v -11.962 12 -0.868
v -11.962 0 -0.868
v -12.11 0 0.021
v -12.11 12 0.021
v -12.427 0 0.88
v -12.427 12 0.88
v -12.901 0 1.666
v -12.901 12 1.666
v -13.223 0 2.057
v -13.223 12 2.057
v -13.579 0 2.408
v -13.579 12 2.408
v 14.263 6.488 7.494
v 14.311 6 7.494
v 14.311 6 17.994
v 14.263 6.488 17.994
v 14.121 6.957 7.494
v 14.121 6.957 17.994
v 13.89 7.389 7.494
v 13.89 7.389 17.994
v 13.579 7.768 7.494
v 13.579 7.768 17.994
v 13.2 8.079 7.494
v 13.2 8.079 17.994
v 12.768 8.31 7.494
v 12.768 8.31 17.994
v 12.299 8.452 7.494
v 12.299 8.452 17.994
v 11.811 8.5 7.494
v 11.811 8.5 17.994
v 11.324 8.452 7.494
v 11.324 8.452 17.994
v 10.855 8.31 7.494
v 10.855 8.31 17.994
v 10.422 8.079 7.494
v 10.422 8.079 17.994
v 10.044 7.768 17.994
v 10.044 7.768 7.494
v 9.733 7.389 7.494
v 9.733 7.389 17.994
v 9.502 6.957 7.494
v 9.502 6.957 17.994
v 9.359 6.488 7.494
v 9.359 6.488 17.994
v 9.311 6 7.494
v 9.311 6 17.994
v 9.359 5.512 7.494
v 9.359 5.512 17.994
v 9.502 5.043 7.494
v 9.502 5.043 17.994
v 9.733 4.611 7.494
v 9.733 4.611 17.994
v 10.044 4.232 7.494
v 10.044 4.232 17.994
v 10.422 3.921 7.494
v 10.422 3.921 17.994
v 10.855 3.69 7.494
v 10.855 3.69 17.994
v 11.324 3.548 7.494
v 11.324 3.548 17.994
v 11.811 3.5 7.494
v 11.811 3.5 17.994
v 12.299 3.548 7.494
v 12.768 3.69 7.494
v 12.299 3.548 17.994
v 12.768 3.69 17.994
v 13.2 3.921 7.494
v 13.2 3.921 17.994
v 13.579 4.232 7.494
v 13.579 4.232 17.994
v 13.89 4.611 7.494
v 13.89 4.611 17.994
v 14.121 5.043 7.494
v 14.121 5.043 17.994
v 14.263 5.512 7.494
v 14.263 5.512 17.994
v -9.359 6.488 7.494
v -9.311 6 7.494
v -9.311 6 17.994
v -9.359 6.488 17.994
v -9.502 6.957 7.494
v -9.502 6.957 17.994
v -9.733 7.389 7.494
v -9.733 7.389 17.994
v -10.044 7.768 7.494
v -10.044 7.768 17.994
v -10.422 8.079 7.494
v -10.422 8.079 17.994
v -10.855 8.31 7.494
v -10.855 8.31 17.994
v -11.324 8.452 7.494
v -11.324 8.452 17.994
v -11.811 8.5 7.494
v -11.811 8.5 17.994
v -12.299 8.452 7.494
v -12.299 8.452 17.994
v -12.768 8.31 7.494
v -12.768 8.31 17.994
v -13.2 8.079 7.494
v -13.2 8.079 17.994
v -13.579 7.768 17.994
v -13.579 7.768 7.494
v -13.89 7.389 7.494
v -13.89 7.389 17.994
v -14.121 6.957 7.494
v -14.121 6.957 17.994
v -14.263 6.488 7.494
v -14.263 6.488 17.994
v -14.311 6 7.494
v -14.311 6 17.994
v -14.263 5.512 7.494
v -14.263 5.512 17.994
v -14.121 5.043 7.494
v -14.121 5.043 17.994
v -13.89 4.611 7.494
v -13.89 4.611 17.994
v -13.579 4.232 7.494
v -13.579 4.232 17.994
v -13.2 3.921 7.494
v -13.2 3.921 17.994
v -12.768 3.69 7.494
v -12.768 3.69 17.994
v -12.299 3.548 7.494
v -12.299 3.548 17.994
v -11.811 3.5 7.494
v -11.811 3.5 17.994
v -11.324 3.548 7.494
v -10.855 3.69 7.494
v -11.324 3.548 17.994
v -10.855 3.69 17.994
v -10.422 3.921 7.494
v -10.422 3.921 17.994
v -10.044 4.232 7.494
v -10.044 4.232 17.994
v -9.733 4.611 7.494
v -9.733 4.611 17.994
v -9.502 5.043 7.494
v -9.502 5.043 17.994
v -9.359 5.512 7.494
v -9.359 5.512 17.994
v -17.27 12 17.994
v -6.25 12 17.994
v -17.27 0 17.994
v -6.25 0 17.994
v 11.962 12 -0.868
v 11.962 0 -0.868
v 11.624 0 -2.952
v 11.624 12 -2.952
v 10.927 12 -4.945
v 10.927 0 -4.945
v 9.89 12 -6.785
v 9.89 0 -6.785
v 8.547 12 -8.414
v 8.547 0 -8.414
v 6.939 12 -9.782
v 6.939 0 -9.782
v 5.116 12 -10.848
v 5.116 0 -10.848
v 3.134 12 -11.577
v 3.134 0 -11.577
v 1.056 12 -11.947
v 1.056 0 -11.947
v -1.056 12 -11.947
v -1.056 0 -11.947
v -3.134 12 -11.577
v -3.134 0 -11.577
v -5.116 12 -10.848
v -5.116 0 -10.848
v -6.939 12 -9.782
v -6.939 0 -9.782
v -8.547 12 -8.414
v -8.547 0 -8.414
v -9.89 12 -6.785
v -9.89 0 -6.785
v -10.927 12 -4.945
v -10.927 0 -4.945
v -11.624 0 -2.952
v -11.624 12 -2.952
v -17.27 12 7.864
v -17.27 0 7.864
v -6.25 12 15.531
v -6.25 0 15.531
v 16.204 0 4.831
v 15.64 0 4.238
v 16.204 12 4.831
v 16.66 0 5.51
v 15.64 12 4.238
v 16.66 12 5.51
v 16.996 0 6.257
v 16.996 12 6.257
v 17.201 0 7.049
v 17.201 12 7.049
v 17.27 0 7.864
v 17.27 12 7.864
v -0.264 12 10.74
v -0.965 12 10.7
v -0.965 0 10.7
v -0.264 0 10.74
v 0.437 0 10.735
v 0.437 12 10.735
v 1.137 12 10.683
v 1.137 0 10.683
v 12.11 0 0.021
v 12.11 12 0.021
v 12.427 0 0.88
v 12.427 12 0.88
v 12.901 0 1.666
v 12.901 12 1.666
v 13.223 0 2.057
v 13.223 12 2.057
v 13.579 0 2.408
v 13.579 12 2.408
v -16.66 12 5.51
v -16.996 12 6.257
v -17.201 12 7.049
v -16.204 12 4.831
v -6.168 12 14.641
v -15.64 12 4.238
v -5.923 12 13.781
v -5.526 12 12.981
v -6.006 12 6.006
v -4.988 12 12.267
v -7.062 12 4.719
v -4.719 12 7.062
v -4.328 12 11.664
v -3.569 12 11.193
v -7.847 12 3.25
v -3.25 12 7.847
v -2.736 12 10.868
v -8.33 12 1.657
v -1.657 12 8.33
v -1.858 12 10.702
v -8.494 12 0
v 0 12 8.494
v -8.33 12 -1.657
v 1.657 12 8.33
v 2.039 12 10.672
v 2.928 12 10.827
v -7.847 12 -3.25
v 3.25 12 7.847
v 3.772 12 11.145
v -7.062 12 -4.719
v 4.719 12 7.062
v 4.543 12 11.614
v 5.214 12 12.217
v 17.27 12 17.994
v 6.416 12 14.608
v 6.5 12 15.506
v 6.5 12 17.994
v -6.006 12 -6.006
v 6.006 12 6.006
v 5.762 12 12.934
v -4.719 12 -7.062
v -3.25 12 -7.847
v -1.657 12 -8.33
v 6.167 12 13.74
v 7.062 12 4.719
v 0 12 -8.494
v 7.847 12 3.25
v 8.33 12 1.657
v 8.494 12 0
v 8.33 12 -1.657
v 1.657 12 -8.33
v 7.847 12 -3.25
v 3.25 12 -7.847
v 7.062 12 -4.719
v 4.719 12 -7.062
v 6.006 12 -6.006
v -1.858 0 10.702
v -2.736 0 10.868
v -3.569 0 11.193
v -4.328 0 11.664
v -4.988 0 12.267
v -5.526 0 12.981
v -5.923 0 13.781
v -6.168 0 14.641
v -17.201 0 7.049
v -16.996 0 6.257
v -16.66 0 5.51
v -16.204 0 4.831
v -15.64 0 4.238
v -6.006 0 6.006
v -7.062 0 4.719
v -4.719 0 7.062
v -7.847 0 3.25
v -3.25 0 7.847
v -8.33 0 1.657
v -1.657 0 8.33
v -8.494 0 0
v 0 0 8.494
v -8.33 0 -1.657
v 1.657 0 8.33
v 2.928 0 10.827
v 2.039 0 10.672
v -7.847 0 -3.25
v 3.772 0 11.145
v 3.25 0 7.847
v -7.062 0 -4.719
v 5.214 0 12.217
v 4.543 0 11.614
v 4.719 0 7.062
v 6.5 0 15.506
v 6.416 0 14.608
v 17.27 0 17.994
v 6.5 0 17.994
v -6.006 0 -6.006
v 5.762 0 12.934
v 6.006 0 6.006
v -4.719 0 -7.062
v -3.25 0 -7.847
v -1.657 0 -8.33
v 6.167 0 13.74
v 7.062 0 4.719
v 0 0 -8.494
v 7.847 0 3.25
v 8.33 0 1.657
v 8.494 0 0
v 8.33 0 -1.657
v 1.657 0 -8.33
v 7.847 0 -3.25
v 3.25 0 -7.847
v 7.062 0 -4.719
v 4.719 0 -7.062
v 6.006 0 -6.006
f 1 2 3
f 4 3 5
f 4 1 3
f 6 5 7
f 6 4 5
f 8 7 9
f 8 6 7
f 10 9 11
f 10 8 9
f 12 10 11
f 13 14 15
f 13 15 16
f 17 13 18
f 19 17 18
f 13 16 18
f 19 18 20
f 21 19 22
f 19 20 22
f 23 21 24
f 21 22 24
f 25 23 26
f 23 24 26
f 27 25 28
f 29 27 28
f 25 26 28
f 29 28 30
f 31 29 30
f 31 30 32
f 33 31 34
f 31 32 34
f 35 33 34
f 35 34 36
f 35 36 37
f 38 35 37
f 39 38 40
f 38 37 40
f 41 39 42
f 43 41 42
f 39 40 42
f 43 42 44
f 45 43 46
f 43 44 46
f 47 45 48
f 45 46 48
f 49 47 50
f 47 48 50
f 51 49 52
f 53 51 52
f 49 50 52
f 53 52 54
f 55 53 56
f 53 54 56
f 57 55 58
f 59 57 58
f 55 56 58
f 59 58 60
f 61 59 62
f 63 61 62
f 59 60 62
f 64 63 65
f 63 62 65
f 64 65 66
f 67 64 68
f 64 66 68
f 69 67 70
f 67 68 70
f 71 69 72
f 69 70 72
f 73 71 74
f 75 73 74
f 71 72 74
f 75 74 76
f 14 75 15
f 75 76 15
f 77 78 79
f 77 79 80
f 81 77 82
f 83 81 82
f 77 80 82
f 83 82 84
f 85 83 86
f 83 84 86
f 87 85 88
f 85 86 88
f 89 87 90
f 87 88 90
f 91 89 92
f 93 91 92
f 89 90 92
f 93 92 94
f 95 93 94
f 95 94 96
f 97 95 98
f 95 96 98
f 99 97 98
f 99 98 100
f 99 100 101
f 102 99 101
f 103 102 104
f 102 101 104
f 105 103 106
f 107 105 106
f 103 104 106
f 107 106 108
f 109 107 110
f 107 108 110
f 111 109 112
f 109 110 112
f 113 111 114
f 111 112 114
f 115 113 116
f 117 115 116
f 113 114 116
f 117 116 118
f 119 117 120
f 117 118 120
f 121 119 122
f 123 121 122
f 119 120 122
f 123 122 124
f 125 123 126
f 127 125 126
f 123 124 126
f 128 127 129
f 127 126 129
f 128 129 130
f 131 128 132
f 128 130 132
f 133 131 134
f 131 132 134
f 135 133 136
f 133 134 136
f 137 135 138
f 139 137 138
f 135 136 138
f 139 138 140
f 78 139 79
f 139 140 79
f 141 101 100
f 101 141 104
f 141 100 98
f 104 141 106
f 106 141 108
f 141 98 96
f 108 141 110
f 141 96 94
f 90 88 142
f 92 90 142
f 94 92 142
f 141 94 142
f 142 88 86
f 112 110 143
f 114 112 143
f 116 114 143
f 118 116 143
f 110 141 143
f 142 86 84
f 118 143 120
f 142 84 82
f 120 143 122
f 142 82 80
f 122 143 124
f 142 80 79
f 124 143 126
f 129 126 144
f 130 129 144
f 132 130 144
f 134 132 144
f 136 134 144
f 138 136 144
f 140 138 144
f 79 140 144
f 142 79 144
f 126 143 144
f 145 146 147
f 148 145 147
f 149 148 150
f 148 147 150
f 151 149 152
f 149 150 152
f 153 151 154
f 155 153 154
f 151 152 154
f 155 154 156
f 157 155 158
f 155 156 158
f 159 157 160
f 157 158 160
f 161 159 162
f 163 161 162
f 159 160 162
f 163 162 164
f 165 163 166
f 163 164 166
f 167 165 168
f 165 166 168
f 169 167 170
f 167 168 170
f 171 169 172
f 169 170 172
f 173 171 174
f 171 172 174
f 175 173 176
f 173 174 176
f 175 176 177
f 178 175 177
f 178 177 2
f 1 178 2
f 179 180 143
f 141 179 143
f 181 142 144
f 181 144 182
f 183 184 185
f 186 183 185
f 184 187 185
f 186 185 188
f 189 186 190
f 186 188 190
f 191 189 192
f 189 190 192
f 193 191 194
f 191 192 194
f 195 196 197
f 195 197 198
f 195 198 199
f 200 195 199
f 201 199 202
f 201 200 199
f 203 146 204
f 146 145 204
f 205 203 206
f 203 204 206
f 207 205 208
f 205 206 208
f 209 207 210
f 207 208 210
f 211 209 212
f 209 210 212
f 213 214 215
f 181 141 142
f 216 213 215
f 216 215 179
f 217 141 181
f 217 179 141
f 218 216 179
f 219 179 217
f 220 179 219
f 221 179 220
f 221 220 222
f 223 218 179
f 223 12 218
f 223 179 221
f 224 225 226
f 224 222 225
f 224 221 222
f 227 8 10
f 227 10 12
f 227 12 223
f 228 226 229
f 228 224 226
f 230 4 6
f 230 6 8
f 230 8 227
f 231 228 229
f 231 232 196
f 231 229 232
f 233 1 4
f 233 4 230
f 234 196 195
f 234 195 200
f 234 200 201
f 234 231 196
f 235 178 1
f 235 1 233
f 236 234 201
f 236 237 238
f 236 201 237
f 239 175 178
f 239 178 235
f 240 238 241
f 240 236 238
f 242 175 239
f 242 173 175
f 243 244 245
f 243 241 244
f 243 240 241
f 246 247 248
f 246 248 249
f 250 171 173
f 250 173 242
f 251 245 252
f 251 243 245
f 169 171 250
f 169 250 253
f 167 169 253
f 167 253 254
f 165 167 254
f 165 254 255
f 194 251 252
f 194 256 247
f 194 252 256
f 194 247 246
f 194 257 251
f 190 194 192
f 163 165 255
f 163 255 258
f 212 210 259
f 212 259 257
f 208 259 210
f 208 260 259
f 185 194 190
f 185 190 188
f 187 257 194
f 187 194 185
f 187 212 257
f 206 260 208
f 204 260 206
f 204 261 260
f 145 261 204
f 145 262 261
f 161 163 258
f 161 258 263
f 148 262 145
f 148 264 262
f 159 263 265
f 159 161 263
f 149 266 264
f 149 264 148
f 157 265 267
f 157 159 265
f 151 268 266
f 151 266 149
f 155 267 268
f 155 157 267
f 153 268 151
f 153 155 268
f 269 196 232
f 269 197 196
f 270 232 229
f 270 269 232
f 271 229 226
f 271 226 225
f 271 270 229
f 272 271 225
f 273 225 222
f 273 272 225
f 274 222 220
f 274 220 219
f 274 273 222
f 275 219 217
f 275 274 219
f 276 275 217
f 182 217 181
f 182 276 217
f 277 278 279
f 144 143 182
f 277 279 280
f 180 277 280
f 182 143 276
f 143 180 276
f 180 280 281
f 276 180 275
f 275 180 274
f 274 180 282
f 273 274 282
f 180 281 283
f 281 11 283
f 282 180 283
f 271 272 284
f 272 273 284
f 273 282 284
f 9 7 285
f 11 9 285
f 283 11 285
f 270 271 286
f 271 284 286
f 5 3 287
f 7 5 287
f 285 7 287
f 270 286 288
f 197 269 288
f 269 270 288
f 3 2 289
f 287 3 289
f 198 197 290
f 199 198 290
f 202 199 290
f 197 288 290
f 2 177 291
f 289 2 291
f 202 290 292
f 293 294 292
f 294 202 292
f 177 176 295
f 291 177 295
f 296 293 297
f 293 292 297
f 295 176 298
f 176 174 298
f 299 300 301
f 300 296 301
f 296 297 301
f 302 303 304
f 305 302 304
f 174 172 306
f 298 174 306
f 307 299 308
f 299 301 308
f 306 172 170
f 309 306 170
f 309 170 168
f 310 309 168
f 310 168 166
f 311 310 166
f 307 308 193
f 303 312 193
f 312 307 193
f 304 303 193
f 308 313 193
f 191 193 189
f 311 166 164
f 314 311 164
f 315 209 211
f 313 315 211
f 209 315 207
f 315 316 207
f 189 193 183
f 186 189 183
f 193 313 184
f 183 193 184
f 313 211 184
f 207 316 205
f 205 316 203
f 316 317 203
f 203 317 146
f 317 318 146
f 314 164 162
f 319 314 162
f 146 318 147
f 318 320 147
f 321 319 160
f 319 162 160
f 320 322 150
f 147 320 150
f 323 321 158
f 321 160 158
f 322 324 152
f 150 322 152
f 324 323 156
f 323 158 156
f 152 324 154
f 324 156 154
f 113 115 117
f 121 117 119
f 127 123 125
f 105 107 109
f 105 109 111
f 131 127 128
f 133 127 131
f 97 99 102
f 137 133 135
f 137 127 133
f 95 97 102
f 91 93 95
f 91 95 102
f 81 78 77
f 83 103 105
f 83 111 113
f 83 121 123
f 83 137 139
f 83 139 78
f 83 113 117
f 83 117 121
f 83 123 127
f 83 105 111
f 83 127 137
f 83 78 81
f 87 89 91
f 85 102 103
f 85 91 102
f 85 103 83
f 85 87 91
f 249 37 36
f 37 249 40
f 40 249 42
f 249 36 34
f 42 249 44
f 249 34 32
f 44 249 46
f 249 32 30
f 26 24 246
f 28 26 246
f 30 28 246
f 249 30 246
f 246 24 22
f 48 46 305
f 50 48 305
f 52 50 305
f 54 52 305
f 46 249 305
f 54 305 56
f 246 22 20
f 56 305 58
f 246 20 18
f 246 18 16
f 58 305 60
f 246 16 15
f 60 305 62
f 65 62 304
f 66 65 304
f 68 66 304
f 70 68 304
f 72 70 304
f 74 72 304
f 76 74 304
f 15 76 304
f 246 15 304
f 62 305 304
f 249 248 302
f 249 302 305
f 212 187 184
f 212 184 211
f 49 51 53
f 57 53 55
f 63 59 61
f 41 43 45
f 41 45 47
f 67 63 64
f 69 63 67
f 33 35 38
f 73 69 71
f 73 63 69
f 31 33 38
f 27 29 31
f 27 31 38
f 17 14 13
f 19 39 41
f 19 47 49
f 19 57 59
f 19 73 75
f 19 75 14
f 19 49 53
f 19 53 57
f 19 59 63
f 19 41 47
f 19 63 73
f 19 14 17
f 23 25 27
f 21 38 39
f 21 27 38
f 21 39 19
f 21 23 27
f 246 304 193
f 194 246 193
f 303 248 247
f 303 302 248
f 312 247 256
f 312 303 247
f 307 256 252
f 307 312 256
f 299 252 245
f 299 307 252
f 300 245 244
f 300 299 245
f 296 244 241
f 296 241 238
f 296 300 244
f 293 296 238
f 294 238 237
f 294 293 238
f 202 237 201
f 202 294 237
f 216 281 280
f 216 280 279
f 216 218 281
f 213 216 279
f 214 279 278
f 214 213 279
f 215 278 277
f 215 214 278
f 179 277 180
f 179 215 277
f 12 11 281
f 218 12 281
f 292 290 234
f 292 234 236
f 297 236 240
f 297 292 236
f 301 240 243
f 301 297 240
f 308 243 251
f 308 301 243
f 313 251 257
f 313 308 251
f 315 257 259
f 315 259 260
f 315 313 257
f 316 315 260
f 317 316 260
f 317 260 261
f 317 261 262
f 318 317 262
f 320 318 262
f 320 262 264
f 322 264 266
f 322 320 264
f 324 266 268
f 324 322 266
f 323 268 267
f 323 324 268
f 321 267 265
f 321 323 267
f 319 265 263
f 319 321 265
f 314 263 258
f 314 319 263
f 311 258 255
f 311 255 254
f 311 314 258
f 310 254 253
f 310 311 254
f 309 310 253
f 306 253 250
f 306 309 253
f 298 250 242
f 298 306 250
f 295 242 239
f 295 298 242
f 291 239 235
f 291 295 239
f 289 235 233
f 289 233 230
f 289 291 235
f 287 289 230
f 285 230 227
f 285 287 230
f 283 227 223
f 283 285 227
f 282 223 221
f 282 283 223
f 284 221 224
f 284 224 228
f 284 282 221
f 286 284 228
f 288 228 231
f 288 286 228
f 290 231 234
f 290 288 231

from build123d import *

# Parameters (mm, degrees)
SKETCH1_R           = 8.4935
BOSS_EXTRUDE1_DEPTH = 12
SKETCH2_R           = 2.5
CUT_EXTRUDE1_DEPTH  = 10.5
CUT_EXTRUDE2_DEPTH  = 20
FILLET1_R           = 4.85


with BuildPart() as part:
    # Sketch1 → Boss-Extrude1 (new body)
    with BuildSketch(Plane(origin=(0, 0, 0), x_dir=(1, 0, 0), z_dir=(0, 1, 0))):
        with BuildLine():
            Line((-11.9935, 0), (-11.9935, -1))
            Line((-11.9935, -1), (-17.270132019, -5.684762464))
            Line((-17.270132019, -5.684762464), (-17.270132019, -17.9935))
            Line((-17.270132019, -17.9935), (-16, -17.9935))
            Line((-16, -17.9935), (16, -17.9935))
            Line((16, -17.9935), (17.270132019, -17.9935))
            Line((17.270132019, -17.9935), (17.270132019, -5.684762464))
            Line((17.270132019, -5.684762464), (11.9935, -1))
            Line((11.9935, -1), (11.9935, 0))
            ThreePointArc((11.9935, 0), (0, 11.9935), (-11.9935, 0))
        make_face()
        with Locations(Location((0, 0, 0), (0, 0, 270))):
            Circle(SKETCH1_R, mode=Mode.SUBTRACT)
    extrude(amount=BOSS_EXTRUDE1_DEPTH)

    # Sketch2 → Cut-Extrude1 (cut)
    with BuildSketch(Plane.XY.offset(17.9935)):
        with Locations((-11.811421167, 6)):
            Circle(SKETCH2_R)
        with Locations((11.811421167, 6)):
            Circle(SKETCH2_R)
    extrude(amount=-CUT_EXTRUDE1_DEPTH, mode=Mode.SUBTRACT)

    # Sketch3 → Cut-Extrude2 (cut)
    with BuildSketch(Plane(origin=(0, 12, 0), x_dir=(1, 0, 0), z_dir=(0, 1, 0))):
        with BuildLine():
            Line((-6.25, -17.9935), (-6.25, -8.738437632))
            ThreePointArc((-6.25, -8.738437632), (0.155303572, -10.742377439), (6.5, -8.55410967))
            Line((6.5, -8.55410967), (6.5, -17.9935))
            Line((6.5, -17.9935), (-6.25, -17.9935))
        make_face()
    extrude(amount=-CUT_EXTRUDE2_DEPTH, mode=Mode.SUBTRACT)

    # Fillet1
    fillet1_edges = [part.edges().sort_by_distance(p)[0] for p in [
        (6.5, 6, 8.55410967),
        (-6.25, 6, 8.738437632),
        (-17.270132019, 6, 5.684762464),
        (-11.9935, 6, 1),
        (11.9935, 6, 1),
        (17.270132019, 6, 5.684762464),
    ]]
    fillet(fillet1_edges, radius=FILLET1_R)


solid = part.part
